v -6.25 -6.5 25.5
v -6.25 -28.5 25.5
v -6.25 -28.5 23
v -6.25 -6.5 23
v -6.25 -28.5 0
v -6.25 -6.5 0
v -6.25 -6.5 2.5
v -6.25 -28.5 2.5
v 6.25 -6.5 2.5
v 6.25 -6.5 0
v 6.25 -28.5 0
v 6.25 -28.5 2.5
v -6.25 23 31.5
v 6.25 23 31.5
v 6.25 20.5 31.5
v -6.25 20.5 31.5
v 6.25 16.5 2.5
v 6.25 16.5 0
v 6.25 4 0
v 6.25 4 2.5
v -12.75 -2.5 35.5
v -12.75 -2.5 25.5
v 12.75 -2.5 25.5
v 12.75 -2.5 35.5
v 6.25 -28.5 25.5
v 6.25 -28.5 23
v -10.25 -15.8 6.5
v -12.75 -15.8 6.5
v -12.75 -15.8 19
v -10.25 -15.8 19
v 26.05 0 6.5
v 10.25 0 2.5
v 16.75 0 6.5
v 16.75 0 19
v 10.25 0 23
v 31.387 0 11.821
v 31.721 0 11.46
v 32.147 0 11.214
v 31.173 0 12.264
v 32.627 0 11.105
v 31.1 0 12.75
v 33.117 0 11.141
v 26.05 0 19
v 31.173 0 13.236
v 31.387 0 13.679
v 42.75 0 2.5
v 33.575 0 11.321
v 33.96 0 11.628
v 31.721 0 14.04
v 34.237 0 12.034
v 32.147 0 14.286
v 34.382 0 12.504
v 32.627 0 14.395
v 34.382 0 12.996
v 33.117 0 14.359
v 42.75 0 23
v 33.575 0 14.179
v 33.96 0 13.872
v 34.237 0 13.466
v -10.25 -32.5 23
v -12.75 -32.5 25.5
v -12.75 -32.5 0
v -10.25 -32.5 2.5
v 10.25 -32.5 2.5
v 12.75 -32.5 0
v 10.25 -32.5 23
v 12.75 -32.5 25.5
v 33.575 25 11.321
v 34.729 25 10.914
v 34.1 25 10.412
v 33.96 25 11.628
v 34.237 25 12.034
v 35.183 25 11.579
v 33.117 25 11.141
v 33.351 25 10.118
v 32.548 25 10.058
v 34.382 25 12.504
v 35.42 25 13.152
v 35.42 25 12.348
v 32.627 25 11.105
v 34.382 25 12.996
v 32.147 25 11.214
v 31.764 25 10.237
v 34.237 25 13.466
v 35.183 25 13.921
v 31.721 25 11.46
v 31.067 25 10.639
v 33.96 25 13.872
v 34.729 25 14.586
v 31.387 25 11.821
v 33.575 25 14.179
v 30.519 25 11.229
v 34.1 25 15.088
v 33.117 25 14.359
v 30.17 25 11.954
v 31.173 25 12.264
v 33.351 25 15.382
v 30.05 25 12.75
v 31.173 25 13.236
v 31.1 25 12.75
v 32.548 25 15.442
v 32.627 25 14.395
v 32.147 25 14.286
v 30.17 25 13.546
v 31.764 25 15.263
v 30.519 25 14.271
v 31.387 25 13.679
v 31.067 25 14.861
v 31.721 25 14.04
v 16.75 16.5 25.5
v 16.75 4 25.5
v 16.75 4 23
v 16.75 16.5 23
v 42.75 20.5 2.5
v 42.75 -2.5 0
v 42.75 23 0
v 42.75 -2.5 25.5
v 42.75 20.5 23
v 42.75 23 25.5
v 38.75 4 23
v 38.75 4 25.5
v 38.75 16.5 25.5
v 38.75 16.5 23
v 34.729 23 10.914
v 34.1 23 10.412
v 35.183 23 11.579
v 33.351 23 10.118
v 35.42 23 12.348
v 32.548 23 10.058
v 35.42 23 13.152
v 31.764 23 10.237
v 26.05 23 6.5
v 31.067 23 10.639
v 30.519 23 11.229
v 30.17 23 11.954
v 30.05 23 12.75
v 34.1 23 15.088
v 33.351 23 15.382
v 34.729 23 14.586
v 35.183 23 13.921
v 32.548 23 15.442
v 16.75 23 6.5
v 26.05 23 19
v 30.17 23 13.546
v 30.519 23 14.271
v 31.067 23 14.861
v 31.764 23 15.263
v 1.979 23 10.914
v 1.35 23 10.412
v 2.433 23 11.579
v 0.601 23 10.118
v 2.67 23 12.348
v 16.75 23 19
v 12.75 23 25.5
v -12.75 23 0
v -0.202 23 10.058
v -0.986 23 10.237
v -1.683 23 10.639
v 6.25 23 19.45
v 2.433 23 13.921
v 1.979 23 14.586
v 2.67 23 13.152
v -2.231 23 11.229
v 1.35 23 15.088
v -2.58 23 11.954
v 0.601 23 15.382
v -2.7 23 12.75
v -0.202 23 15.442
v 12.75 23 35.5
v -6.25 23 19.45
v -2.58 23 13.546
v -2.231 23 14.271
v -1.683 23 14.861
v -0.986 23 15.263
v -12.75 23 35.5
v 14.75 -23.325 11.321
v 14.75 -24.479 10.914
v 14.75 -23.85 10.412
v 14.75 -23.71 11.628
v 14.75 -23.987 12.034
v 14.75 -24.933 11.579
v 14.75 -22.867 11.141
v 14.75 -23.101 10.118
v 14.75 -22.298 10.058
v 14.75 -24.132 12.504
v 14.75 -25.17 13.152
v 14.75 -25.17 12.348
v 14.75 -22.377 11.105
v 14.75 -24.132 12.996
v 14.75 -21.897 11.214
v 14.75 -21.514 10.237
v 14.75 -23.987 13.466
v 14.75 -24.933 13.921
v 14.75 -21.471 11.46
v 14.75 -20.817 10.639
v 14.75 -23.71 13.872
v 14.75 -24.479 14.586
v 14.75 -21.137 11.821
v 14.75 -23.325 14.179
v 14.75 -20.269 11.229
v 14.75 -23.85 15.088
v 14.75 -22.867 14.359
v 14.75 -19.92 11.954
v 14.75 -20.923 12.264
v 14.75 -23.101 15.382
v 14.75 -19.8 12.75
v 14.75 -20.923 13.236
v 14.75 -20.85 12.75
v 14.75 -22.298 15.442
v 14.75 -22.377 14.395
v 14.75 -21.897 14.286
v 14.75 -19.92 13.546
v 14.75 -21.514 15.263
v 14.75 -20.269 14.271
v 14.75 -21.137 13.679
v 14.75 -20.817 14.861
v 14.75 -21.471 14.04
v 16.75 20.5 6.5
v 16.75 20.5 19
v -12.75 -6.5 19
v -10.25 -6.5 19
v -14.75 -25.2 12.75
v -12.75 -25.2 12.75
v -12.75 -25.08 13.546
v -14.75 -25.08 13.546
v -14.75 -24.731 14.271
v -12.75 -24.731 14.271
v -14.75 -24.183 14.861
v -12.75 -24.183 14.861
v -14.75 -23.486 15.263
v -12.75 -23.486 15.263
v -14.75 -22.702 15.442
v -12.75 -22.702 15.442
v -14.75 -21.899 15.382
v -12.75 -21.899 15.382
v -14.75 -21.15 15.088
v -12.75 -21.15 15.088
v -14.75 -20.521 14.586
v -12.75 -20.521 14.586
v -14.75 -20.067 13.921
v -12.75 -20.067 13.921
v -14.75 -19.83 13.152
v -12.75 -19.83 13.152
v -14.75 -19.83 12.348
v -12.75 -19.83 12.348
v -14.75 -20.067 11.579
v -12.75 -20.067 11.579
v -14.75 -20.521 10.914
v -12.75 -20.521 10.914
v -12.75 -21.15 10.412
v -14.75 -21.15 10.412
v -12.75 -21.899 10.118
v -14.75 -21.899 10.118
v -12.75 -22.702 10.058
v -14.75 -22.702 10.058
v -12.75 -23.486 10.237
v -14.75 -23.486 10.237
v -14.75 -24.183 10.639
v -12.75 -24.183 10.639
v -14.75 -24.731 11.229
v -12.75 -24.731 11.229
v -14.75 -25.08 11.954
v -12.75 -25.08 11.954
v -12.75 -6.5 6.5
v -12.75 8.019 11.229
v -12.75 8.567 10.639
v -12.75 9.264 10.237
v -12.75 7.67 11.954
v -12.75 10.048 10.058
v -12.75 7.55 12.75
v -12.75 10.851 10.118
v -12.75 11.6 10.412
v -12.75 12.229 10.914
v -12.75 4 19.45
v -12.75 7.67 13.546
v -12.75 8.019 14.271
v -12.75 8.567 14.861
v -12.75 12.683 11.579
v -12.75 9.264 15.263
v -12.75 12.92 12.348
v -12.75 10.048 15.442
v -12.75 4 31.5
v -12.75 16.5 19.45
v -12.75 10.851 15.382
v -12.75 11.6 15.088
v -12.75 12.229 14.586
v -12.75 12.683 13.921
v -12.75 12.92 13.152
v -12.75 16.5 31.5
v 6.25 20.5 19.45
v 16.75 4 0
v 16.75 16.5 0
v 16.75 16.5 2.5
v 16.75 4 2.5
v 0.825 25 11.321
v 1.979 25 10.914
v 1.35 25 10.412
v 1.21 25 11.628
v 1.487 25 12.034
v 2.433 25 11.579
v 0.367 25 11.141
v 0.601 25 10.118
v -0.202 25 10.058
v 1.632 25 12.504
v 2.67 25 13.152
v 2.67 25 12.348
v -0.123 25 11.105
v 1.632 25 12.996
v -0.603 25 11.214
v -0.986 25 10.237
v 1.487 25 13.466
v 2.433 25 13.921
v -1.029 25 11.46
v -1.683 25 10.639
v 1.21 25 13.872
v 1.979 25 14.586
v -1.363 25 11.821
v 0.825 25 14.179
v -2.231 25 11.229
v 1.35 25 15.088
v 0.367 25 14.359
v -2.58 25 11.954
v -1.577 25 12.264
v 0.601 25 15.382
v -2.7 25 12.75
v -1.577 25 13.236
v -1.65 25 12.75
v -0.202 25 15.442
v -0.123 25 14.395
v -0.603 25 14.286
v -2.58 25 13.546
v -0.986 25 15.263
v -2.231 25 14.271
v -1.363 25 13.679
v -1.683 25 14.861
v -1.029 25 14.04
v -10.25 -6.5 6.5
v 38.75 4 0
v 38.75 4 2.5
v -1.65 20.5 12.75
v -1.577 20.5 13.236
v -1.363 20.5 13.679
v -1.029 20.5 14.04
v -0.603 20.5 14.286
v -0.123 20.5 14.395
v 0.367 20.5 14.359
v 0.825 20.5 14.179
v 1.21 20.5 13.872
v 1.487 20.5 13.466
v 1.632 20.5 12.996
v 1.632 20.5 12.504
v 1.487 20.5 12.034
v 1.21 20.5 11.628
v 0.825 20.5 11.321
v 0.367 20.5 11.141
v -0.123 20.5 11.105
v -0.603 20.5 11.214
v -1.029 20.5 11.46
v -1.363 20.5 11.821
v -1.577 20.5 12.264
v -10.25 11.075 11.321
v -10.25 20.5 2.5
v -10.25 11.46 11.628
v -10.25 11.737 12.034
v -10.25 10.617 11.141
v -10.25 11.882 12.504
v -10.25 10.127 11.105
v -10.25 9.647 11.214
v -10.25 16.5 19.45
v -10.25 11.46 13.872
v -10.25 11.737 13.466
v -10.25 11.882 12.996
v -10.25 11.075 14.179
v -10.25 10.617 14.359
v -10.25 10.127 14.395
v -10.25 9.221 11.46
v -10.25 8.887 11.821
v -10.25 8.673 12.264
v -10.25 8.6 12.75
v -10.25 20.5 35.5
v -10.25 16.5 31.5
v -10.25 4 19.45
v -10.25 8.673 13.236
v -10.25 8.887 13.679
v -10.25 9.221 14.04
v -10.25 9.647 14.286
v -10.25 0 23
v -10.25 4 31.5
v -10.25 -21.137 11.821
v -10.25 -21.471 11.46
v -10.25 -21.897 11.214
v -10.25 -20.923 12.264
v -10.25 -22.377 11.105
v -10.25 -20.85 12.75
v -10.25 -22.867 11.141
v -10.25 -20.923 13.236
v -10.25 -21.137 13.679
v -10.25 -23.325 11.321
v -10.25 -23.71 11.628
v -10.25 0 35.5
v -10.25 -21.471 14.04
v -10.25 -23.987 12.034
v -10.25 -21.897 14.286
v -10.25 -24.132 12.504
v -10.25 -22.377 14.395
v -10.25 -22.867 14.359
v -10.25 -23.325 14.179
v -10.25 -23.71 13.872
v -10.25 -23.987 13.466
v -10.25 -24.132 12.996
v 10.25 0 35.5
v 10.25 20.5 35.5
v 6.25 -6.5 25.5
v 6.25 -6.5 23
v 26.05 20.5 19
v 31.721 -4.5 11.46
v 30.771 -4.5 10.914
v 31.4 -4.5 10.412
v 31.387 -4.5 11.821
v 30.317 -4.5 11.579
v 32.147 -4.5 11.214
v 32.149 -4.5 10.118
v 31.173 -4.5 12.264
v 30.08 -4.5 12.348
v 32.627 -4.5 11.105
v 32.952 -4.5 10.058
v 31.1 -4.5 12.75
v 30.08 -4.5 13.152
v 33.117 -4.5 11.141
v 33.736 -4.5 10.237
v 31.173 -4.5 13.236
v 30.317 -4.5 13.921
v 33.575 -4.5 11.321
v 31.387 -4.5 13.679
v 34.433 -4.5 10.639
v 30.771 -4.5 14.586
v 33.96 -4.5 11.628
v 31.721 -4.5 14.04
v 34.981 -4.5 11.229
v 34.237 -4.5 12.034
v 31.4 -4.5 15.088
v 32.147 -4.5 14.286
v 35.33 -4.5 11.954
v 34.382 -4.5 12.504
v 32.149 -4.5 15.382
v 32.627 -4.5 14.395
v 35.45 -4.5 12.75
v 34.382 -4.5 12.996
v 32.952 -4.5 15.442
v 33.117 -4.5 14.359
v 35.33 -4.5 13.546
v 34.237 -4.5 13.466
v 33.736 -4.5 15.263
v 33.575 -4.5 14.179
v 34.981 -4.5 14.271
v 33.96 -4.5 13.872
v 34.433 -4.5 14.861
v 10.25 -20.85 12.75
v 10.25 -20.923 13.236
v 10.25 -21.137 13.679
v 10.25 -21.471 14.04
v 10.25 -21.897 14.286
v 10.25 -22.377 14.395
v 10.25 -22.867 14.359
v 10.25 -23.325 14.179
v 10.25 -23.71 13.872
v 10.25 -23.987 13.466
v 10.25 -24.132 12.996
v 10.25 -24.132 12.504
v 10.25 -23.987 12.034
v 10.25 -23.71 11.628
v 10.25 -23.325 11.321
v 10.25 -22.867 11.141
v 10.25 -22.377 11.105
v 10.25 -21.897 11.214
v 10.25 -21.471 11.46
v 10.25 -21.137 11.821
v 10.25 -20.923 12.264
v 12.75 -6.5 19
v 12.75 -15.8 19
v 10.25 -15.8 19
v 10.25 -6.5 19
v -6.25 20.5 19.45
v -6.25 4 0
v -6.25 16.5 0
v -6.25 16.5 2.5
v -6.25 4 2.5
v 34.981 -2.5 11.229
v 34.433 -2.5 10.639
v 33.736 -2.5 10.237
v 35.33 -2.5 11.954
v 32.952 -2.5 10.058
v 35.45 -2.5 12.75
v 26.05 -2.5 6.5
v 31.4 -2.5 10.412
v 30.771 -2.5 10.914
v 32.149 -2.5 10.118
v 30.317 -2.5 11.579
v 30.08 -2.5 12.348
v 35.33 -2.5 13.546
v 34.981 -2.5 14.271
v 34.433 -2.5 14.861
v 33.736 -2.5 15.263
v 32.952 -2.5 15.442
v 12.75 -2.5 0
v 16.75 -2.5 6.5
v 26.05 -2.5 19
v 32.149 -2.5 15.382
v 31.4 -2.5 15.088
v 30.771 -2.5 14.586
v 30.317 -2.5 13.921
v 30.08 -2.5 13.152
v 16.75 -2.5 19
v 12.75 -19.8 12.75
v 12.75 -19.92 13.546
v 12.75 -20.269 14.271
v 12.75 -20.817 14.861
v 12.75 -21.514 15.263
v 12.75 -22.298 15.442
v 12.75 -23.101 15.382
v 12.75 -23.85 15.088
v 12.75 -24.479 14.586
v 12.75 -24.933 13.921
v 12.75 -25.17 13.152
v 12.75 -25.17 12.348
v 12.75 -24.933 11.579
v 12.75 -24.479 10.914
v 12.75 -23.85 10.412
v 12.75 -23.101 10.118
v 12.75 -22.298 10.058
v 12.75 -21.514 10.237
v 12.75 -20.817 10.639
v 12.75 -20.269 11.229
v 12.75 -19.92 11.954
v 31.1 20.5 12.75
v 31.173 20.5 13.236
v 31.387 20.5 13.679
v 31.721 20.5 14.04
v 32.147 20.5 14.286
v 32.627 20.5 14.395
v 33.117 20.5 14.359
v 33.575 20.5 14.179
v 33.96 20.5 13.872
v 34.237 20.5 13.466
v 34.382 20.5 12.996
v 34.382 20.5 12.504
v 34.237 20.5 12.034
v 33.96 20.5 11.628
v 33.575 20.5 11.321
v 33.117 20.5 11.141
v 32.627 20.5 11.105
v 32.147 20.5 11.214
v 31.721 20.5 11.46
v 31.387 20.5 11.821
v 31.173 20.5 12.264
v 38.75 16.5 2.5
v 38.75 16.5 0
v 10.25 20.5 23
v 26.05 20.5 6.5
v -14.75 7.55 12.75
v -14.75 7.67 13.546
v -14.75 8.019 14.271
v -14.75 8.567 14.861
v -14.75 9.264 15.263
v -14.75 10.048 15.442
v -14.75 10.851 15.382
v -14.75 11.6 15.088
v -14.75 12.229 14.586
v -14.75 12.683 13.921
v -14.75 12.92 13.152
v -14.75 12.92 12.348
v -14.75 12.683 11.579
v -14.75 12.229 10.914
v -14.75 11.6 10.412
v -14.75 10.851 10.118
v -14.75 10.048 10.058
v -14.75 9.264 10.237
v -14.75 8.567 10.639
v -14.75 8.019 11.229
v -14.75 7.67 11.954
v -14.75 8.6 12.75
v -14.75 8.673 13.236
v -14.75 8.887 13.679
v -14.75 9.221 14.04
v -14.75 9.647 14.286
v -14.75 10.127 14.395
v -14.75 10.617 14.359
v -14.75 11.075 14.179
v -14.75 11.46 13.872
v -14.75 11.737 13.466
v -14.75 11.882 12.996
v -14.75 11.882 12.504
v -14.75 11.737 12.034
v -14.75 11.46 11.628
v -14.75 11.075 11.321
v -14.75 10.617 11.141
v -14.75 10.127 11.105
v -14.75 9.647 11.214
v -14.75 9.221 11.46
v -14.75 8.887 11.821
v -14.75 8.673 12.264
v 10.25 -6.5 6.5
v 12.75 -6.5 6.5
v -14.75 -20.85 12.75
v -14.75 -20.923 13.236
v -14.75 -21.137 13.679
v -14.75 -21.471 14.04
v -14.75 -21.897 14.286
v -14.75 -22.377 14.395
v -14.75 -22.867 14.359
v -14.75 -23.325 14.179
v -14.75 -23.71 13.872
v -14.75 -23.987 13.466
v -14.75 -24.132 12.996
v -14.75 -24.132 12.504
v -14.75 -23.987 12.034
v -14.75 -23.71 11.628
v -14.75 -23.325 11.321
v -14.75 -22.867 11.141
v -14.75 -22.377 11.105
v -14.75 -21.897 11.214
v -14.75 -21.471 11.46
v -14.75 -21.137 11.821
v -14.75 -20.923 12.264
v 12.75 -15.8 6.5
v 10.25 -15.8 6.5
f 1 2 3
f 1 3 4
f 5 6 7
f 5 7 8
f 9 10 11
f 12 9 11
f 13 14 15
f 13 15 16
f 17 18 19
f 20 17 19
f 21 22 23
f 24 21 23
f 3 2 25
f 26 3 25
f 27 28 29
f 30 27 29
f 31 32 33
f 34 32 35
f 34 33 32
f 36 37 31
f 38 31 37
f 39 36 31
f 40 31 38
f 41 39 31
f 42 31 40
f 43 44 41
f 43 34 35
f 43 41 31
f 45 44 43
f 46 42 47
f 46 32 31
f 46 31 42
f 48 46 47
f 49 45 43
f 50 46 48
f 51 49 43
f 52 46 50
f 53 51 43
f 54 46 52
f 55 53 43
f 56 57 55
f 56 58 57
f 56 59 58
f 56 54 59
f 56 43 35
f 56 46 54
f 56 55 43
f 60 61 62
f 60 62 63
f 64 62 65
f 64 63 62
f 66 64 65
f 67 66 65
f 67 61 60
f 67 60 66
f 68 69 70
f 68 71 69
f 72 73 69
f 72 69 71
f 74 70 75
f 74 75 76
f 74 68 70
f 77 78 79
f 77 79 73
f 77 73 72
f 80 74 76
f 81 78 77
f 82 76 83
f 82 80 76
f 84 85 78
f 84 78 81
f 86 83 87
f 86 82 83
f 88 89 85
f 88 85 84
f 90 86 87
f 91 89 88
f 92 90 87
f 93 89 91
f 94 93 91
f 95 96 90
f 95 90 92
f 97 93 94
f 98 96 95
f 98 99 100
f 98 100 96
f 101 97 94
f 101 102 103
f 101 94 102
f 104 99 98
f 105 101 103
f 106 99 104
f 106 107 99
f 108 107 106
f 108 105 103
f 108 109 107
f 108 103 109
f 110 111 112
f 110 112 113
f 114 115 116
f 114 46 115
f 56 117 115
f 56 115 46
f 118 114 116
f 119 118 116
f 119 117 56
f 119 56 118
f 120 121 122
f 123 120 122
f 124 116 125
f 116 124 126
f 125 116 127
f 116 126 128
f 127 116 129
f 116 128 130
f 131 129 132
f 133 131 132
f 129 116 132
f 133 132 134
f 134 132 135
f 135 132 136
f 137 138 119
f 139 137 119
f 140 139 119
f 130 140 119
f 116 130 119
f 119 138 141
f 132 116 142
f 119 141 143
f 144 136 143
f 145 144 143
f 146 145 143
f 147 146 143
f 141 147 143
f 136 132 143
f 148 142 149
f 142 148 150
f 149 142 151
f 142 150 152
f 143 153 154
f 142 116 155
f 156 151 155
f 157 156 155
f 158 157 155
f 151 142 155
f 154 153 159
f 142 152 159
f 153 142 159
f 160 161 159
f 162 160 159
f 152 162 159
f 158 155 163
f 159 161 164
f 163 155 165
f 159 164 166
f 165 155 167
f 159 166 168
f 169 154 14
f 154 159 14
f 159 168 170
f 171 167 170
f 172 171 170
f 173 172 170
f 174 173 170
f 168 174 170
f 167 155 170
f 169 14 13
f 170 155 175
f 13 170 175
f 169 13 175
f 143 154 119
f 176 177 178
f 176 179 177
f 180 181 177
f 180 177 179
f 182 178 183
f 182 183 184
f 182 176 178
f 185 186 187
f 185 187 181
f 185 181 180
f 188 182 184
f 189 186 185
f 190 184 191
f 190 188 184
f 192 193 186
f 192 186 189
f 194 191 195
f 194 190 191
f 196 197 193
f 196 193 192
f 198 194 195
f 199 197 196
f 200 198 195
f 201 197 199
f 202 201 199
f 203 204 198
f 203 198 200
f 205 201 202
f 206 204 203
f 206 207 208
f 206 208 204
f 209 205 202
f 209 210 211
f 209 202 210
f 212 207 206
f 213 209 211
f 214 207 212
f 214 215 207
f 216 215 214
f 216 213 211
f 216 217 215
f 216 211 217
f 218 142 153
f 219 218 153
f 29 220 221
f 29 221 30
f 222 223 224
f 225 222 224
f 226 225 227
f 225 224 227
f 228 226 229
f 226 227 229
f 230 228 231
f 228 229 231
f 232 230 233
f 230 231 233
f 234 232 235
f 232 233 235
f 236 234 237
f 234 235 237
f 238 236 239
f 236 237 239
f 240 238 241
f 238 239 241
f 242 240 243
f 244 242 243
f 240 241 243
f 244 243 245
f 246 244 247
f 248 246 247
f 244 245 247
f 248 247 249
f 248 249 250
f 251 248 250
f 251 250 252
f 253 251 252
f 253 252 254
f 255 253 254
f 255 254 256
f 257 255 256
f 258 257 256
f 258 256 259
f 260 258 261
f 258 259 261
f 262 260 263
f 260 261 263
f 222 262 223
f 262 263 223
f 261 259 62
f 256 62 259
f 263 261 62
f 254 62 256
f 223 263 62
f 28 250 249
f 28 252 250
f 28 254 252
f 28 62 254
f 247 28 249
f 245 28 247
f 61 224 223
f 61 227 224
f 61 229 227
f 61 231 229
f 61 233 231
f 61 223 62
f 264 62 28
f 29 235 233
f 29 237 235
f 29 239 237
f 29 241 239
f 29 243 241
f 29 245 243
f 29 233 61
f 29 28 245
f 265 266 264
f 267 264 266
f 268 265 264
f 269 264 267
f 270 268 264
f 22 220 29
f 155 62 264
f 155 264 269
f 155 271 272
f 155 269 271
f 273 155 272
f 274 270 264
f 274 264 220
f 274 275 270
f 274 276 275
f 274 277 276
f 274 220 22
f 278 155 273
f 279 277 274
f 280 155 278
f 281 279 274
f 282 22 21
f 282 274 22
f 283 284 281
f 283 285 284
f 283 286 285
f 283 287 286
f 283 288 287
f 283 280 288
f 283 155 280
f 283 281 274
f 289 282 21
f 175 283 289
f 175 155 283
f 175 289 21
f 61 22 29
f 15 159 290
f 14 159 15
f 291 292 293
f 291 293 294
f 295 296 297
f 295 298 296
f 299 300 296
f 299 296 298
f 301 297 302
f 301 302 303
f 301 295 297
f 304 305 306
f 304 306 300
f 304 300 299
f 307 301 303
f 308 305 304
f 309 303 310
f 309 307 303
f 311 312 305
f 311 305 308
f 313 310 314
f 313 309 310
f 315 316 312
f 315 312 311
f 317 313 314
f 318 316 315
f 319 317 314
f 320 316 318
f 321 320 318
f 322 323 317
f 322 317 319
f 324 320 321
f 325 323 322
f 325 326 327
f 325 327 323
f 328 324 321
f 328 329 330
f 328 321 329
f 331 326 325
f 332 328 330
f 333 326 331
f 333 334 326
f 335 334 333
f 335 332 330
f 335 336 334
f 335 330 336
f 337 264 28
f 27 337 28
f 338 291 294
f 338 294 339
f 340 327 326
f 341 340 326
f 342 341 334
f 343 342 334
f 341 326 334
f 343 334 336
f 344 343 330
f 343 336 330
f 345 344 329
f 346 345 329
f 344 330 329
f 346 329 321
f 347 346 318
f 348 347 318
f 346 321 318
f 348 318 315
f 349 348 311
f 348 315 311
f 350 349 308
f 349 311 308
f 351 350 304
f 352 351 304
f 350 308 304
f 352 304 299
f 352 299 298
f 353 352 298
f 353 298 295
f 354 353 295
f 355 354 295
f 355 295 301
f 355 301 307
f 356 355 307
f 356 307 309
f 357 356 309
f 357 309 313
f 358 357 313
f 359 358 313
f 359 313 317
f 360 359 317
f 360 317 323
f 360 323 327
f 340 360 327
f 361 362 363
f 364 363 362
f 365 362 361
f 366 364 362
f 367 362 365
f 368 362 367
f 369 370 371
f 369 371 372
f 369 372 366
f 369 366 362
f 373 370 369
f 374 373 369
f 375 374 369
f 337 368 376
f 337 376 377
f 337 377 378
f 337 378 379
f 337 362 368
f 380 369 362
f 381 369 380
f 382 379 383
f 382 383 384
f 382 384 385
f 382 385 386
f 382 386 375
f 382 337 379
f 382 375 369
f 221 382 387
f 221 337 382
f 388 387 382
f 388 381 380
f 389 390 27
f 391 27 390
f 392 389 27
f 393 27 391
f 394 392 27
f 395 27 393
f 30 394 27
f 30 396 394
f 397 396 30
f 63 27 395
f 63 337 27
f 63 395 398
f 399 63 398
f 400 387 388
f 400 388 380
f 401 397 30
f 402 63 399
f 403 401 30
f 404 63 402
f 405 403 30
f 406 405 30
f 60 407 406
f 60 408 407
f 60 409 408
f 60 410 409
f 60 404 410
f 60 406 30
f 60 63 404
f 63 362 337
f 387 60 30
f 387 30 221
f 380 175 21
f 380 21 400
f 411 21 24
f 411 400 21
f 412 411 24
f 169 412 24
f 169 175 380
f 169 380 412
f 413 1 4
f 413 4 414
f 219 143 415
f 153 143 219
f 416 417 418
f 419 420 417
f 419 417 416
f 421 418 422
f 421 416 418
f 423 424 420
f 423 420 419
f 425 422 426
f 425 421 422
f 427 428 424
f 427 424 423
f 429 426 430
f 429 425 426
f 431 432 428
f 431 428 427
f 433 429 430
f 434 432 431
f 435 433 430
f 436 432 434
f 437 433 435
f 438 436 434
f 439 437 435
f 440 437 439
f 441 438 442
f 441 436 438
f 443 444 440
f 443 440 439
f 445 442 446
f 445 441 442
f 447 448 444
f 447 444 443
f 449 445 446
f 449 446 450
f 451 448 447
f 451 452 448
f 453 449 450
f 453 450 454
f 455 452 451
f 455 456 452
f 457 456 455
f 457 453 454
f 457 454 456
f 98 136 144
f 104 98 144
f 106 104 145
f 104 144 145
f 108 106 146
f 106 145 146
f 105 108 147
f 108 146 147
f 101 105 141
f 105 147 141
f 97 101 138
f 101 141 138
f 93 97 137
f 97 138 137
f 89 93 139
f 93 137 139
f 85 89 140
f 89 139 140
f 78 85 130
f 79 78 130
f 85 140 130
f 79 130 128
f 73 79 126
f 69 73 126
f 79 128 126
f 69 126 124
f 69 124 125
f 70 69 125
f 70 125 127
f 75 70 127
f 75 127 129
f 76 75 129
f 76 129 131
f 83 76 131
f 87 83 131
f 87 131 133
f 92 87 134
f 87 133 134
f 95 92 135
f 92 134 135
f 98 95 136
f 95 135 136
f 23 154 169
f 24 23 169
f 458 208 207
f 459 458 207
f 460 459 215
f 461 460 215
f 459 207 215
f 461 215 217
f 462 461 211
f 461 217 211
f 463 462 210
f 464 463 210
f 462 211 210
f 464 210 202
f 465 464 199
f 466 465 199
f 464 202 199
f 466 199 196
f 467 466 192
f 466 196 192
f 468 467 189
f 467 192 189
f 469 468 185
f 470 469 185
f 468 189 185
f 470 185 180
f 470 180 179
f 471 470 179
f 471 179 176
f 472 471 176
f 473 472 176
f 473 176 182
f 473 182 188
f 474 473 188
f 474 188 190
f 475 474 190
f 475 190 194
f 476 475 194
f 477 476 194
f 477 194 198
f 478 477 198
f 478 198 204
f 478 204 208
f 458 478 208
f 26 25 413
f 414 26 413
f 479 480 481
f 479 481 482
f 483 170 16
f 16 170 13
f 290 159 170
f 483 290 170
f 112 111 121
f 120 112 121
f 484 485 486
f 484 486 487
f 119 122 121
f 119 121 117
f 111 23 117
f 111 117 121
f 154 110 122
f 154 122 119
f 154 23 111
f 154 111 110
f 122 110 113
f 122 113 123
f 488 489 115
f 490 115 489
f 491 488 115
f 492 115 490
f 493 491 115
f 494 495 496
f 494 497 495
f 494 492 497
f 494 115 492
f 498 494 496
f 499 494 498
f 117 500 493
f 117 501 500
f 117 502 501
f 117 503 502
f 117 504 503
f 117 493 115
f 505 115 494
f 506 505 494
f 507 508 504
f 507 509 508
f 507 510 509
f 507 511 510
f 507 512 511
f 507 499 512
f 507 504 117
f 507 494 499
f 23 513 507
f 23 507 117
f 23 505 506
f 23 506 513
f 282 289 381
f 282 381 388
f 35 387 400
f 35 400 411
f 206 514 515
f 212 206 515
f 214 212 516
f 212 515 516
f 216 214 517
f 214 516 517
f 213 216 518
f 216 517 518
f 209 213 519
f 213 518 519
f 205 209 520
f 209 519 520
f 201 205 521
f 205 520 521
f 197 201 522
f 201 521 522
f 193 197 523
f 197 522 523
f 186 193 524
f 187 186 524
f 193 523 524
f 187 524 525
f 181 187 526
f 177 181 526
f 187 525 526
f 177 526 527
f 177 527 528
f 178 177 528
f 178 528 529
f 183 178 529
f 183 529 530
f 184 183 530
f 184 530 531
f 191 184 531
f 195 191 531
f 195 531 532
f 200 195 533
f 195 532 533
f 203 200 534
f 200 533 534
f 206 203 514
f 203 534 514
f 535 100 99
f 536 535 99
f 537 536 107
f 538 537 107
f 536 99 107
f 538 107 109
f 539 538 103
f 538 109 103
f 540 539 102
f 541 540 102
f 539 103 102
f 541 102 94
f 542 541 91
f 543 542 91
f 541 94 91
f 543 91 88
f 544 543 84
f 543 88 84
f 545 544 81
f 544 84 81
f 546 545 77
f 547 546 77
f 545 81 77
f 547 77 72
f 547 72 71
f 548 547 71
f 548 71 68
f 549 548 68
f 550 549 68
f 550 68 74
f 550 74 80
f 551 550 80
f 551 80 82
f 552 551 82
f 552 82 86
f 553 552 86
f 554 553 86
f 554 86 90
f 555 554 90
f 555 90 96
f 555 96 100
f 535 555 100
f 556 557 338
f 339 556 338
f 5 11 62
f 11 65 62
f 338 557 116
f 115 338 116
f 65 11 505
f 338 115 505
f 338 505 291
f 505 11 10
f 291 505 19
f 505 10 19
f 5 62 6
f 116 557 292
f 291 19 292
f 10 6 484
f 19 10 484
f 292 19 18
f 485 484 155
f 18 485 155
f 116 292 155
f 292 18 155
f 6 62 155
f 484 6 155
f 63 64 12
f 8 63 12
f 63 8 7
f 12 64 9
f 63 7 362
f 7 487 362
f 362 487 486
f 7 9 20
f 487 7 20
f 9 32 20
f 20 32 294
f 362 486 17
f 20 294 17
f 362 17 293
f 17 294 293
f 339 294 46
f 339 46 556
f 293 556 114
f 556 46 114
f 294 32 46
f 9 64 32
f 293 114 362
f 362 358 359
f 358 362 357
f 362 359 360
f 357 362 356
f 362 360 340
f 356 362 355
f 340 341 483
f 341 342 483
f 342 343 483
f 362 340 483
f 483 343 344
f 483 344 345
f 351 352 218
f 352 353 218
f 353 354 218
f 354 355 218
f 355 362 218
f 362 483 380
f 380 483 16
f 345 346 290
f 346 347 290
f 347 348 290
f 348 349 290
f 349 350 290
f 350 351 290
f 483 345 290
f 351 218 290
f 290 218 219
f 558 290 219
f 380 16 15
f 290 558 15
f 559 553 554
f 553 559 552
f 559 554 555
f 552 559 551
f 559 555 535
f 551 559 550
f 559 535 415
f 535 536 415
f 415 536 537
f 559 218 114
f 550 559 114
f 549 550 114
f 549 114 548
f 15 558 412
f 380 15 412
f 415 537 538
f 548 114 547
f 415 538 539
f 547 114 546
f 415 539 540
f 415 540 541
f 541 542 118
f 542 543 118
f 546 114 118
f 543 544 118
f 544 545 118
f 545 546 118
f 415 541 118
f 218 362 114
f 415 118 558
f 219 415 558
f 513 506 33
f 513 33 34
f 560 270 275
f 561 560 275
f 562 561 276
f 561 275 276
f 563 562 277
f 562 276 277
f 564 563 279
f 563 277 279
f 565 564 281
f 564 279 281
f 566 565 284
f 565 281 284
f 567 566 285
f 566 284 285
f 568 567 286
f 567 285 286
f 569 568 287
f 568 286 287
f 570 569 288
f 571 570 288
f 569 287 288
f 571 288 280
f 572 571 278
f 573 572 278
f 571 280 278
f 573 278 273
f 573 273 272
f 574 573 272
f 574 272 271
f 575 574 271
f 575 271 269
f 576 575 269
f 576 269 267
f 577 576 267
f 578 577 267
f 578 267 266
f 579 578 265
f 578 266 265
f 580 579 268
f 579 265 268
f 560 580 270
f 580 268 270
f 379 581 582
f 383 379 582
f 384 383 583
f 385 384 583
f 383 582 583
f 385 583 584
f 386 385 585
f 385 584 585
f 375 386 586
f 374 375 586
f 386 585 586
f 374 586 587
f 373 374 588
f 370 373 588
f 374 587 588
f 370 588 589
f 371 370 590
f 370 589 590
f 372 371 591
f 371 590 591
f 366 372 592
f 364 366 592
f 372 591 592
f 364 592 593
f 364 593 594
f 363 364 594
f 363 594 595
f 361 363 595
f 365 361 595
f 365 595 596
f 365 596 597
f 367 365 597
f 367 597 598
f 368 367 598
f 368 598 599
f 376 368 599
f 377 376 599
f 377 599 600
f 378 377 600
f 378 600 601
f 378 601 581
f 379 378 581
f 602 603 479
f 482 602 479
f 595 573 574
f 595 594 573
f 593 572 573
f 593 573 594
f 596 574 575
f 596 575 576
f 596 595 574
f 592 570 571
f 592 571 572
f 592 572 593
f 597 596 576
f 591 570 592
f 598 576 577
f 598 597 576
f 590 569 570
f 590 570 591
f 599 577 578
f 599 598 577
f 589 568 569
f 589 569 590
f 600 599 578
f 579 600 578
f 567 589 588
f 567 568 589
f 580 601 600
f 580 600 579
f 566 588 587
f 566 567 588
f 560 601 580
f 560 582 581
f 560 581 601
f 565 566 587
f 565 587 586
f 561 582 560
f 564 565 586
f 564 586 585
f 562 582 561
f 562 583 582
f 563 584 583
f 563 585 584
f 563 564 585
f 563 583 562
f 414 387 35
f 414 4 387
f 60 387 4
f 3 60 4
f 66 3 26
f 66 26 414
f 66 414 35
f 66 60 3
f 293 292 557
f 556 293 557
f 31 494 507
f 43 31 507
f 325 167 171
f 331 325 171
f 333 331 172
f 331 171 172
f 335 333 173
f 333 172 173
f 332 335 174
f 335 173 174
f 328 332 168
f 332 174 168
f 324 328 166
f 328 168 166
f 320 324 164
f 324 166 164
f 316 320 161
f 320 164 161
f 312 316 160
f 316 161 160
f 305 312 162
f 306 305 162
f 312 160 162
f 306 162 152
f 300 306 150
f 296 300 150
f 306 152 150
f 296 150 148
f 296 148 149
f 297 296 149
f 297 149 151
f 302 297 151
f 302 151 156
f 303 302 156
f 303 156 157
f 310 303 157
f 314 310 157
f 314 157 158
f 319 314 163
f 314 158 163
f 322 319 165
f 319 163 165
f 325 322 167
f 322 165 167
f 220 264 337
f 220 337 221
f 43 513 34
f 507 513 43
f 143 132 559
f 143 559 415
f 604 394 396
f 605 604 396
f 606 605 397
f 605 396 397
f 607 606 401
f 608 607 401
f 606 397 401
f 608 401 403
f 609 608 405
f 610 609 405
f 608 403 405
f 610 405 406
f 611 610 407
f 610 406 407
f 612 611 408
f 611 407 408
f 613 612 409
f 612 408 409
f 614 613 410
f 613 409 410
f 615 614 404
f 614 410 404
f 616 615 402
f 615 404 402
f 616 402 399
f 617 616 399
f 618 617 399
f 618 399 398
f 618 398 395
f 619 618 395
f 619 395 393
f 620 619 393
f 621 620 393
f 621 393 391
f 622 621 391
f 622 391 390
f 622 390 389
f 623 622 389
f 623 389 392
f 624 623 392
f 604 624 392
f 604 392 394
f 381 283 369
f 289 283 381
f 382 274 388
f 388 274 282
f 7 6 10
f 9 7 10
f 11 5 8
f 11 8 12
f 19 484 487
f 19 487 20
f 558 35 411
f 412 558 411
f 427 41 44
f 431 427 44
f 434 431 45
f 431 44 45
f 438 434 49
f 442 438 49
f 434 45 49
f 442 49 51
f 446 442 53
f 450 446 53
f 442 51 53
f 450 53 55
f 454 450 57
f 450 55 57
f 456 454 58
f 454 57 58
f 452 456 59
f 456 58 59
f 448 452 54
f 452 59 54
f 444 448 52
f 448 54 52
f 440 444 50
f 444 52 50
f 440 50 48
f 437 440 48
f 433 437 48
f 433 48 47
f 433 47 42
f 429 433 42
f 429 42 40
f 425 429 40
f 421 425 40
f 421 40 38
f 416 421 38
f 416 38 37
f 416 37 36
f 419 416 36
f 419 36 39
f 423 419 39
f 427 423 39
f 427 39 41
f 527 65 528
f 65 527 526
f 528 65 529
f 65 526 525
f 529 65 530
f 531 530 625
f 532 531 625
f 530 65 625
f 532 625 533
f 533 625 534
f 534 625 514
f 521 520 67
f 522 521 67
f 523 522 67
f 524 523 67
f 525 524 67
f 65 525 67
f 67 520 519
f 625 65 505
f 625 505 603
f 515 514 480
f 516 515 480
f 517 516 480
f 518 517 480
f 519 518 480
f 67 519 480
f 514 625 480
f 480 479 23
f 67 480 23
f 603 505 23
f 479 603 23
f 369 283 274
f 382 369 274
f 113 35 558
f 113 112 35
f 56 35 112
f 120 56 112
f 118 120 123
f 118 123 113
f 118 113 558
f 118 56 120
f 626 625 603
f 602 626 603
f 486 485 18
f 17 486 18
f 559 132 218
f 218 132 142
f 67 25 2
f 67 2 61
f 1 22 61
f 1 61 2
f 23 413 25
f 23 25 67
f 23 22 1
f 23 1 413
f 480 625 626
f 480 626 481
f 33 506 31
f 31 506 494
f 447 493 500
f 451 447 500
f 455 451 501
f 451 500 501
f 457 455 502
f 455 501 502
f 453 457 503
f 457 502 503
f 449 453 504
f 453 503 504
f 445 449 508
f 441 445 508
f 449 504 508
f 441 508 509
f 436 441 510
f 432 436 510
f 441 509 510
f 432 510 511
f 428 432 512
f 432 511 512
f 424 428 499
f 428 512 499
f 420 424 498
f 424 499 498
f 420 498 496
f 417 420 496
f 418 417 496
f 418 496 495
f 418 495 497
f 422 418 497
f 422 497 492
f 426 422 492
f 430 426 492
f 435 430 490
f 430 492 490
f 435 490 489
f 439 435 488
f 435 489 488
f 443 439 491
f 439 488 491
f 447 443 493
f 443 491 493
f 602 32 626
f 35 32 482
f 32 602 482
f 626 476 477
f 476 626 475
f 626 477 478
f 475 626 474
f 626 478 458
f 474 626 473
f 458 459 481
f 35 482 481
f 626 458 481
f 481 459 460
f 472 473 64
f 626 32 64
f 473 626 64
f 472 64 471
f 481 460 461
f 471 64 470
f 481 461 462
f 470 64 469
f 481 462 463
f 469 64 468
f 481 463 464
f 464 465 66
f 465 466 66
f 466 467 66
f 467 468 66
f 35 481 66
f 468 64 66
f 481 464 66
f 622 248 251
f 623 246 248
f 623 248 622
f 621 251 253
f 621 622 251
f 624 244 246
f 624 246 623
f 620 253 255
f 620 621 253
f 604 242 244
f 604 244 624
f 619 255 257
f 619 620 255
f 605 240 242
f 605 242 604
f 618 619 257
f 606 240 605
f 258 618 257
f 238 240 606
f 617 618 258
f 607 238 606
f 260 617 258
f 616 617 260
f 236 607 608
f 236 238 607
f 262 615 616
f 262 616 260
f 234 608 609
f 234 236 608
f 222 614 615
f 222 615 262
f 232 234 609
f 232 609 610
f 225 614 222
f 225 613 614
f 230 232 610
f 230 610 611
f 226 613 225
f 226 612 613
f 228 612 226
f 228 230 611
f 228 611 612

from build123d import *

# Parameters (mm, degrees)
F0_W      = 25.5
F0_H      = 25.5
F0_W_2    = 20.5
F0_H_2    = 20.5
F1_DEPTH  = 35.5
F2_W      = 25.5
F2_H      = 25.5
F3_DEPTH  = 30
F4_DEPTH  = 10
F5_W      = 20.5
F5_H      = 20.5
F6_DEPTH  = 32.5
F7_W      = 20.5
F7_H      = 20.5
F8_DEPTH  = 2.5
F9_W      = 25.5
F9_H      = 25.5
F10_DEPTH = 30
F11_W     = 20.5
F11_H     = 20.5
F12_DEPTH = 32.5
F13_R     = 2.7
F14_DEPTH = 2
F15_R     = 2.7
F16_DEPTH = 2
F17_R     = 1.65
F18_DEPTH = 30
F19_R     = 2.7
F20_DEPTH = 2
F21_R     = 2.7
F22_DEPTH = 2
F23_R     = 1.65
F24_DEPTH = 30
F25_R     = 2.7
F26_DEPTH = 2
F27_R     = 1.65
F28_DEPTH = 25
F29_R     = 2.7
F30_DEPTH = 2
F31_R     = 1.65
F32_DEPTH = 25
F33_W     = 22
F33_H     = 12.5
F33_W_2   = 12.5
F33_H_2   = 22
F34_DEPTH = 2.5
F35_W     = 9.3
F35_H     = 12.5
F36_DEPTH = 2.5
F37_W     = 9.3
F37_H     = 12.5
F37_W_2   = 12.5
F37_H_2   = 12.05
F38_DEPTH = 2.5
F39_W     = 9.3
F39_H     = 12.5
F39_W_2   = 12.5
F39_H_2   = 12.05
F40_DEPTH = 2.5
F41_W     = 22
F41_H     = 12.5
F41_W_2   = 12.5
F41_H_2   = 22
F42_DEPTH = 2.5
F43_W     = 9.3
F43_H     = 12.5
F44_DEPTH = 2.5


with BuildPart() as f1:
    # F0 (on Top) → F1 (new body)
    with BuildSketch(Plane.XY):
        with Locations((0, 10.25)):
            Rectangle(F0_W, F0_H)
        with Locations((0, 10.25)):
            Rectangle(F0_W_2, F0_H_2, mode=Mode.SUBTRACT)
    extrude(amount=F1_DEPTH)

    # F2 (on face) → F3 (join)
    with BuildSketch(Plane.XZ.offset(2.5)):
        with Locations((0, 12.75)):
            Rectangle(F2_W, F2_H)
    extrude(amount=F3_DEPTH)

    # F2 (on face) → F4 (join)
    with BuildSketch(Plane.XZ.offset(2.5)):
        with Locations((0, 12.75)):
            Rectangle(F2_W, F2_H)
    extrude(amount=F4_DEPTH)

    # F5 (on face) → F6 (cut)
    with BuildSketch(Plane.XZ.offset(32.5)):
        with Locations((0, 12.75)):
            Rectangle(F5_W, F5_H)
    extrude(amount=-F6_DEPTH, mode=Mode.SUBTRACT)

    # F7 (on face) → F8 (join)
    with BuildSketch(Plane(origin=(0, 0, 0), x_dir=(1, 0, 0), z_dir=(0, 0, -1))):
        with Locations((0, -10.25)):
            Rectangle(F7_W, F7_H)
    extrude(amount=-F8_DEPTH)

    # F9 (on face) → F10 (join)
    with BuildSketch(Plane.YZ.offset(12.75)):
        with Locations((10.25, 12.75)):
            Rectangle(F9_W, F9_H)
    extrude(amount=F10_DEPTH)

    # F11 (on face) → F12 (cut)
    with BuildSketch(Plane.YZ.offset(42.75)):
        with Locations((10.25, 12.75)):
            Rectangle(F11_W, F11_H)
    extrude(amount=-F12_DEPTH, mode=Mode.SUBTRACT)

    # F13 (on face) → F14 (join)
    with BuildSketch(Plane.YZ.offset(12.75)):
        with Locations((-22.5, 12.75)):
            Circle(F13_R)
    extrude(amount=F14_DEPTH)

    # F15 (on face) → F16 (join)
    with BuildSketch(Plane(origin=(-12.75, 0, 0), x_dir=(0, -1, 0), z_dir=(-1, 0, 0))):
        with Locations((22.5, 12.75)):
            Circle(F15_R)
    extrude(amount=F16_DEPTH)

    # F17 (on face) → F18 (cut)
    with BuildSketch(Plane.YZ.offset(14.75)):
        with Locations((-22.5, 12.75)):
            Circle(F17_R)
    extrude(amount=-F18_DEPTH, mode=Mode.SUBTRACT)

    # F19 (on face) → F20 (join)
    with BuildSketch(Plane.XZ.offset(2.5)):
        with Locations((32.75, 12.75)):
            Circle(F19_R)
    extrude(amount=F20_DEPTH)

    # F21 (on face) → F22 (join)
    with BuildSketch(Plane(origin=(0, 23, 0), x_dir=(-1, 0, 0), z_dir=(0, 1, 0))):
        with Locations((-32.75, 12.75)):
            Circle(F21_R)
    extrude(amount=F22_DEPTH)

    # F23 (on face) → F24 (cut)
    with BuildSketch(Plane(origin=(0, 25, 0), x_dir=(-1, 0, 0), z_dir=(0, 1, 0))):
        with Locations((-32.75, 12.75)):
            Circle(F23_R)
    extrude(amount=-F24_DEPTH, mode=Mode.SUBTRACT)

    # F25 (on face) → F26 (join)
    with BuildSketch(Plane(origin=(-12.75, 0, 0), x_dir=(0, -1, 0), z_dir=(-1, 0, 0))):
        with Locations((-10.25, 12.75)):
            Circle(F25_R)
    extrude(amount=F26_DEPTH)

    # F27 (on face) → F28 (cut)
    with BuildSketch(Plane(origin=(-14.75, 0, 0), x_dir=(0, -1, 0), z_dir=(-1, 0, 0))):
        with Locations((-10.25, 12.75)):
            Circle(F27_R)
    extrude(amount=-F28_DEPTH, mode=Mode.SUBTRACT)

    # F29 (on face) → F30 (join)
    with BuildSketch(Plane(origin=(0, 23, 0), x_dir=(-1, 0, 0), z_dir=(0, 1, 0))):
        with Locations((0, 12.75)):
            Circle(F29_R)
    extrude(amount=F30_DEPTH)

    # F31 (on face) → F32 (cut)
    with BuildSketch(Plane(origin=(0, 25, 0), x_dir=(-1, 0, 0), z_dir=(0, 1, 0))):
        with Locations((0, 12.75)):
            Circle(F31_R)
    extrude(amount=-F32_DEPTH, mode=Mode.SUBTRACT)

    # F33 (on face) → F34 (cut)
    with BuildSketch(Plane(origin=(0, 0, 0), x_dir=(1, 0, 0), z_dir=(0, 0, -1))):
        with Locations((27.75, -10.25)):
            Rectangle(F33_W, F33_H)
        with Locations((0, -10.25)):
            Rectangle(F33_W_2, F33_H)
        with Locations((0, 17.5)):
            Rectangle(F33_W_2, F33_H_2)
    extrude(amount=-F34_DEPTH, mode=Mode.SUBTRACT)

    # F35 (on face) → F36 (cut)
    with BuildSketch(Plane.YZ.offset(12.75)):
        with Locations((-11.15, 12.75)):
            Rectangle(F35_W, F35_H)
    extrude(amount=-F36_DEPTH, mode=Mode.SUBTRACT)

    # F37 (on face) → F38 (cut)
    with BuildSketch(Plane(origin=(-12.75, 0, 0), x_dir=(0, -1, 0), z_dir=(-1, 0, 0))):
        with Locations((11.15, 12.75)):
            Rectangle(F37_W, F37_H)
        with Locations((-10.25, 25.475)):
            Rectangle(F37_W_2, F37_H_2)
    extrude(amount=-F38_DEPTH, mode=Mode.SUBTRACT)

    # F39 (on face) → F40 (cut)
    with BuildSketch(Plane(origin=(0, 23, 0), x_dir=(-1, 0, 0), z_dir=(0, 1, 0))):
        with Locations((-21.4, 12.75)):
            Rectangle(F39_W, F39_H)
        with Locations((0, 25.475)):
            Rectangle(F39_W_2, F39_H_2)
    extrude(amount=-F40_DEPTH, mode=Mode.SUBTRACT)

    # F41 (on face) → F42 (cut)
    with BuildSketch(Plane.XY.offset(25.5)):
        with Locations((27.75, 10.25)):
            Rectangle(F41_W, F41_H)
        with Locations((0, -17.5)):
            Rectangle(F41_W_2, F41_H_2)
    extrude(amount=-F42_DEPTH, mode=Mode.SUBTRACT)

    # F43 (on face) → F44 (cut)
    with BuildSketch(Plane.XZ.offset(2.5)):
        with Locations((21.4, 12.75)):
            Rectangle(F43_W, F43_H)
    extrude(amount=-F44_DEPTH, mode=Mode.SUBTRACT)


solid = f1.part
